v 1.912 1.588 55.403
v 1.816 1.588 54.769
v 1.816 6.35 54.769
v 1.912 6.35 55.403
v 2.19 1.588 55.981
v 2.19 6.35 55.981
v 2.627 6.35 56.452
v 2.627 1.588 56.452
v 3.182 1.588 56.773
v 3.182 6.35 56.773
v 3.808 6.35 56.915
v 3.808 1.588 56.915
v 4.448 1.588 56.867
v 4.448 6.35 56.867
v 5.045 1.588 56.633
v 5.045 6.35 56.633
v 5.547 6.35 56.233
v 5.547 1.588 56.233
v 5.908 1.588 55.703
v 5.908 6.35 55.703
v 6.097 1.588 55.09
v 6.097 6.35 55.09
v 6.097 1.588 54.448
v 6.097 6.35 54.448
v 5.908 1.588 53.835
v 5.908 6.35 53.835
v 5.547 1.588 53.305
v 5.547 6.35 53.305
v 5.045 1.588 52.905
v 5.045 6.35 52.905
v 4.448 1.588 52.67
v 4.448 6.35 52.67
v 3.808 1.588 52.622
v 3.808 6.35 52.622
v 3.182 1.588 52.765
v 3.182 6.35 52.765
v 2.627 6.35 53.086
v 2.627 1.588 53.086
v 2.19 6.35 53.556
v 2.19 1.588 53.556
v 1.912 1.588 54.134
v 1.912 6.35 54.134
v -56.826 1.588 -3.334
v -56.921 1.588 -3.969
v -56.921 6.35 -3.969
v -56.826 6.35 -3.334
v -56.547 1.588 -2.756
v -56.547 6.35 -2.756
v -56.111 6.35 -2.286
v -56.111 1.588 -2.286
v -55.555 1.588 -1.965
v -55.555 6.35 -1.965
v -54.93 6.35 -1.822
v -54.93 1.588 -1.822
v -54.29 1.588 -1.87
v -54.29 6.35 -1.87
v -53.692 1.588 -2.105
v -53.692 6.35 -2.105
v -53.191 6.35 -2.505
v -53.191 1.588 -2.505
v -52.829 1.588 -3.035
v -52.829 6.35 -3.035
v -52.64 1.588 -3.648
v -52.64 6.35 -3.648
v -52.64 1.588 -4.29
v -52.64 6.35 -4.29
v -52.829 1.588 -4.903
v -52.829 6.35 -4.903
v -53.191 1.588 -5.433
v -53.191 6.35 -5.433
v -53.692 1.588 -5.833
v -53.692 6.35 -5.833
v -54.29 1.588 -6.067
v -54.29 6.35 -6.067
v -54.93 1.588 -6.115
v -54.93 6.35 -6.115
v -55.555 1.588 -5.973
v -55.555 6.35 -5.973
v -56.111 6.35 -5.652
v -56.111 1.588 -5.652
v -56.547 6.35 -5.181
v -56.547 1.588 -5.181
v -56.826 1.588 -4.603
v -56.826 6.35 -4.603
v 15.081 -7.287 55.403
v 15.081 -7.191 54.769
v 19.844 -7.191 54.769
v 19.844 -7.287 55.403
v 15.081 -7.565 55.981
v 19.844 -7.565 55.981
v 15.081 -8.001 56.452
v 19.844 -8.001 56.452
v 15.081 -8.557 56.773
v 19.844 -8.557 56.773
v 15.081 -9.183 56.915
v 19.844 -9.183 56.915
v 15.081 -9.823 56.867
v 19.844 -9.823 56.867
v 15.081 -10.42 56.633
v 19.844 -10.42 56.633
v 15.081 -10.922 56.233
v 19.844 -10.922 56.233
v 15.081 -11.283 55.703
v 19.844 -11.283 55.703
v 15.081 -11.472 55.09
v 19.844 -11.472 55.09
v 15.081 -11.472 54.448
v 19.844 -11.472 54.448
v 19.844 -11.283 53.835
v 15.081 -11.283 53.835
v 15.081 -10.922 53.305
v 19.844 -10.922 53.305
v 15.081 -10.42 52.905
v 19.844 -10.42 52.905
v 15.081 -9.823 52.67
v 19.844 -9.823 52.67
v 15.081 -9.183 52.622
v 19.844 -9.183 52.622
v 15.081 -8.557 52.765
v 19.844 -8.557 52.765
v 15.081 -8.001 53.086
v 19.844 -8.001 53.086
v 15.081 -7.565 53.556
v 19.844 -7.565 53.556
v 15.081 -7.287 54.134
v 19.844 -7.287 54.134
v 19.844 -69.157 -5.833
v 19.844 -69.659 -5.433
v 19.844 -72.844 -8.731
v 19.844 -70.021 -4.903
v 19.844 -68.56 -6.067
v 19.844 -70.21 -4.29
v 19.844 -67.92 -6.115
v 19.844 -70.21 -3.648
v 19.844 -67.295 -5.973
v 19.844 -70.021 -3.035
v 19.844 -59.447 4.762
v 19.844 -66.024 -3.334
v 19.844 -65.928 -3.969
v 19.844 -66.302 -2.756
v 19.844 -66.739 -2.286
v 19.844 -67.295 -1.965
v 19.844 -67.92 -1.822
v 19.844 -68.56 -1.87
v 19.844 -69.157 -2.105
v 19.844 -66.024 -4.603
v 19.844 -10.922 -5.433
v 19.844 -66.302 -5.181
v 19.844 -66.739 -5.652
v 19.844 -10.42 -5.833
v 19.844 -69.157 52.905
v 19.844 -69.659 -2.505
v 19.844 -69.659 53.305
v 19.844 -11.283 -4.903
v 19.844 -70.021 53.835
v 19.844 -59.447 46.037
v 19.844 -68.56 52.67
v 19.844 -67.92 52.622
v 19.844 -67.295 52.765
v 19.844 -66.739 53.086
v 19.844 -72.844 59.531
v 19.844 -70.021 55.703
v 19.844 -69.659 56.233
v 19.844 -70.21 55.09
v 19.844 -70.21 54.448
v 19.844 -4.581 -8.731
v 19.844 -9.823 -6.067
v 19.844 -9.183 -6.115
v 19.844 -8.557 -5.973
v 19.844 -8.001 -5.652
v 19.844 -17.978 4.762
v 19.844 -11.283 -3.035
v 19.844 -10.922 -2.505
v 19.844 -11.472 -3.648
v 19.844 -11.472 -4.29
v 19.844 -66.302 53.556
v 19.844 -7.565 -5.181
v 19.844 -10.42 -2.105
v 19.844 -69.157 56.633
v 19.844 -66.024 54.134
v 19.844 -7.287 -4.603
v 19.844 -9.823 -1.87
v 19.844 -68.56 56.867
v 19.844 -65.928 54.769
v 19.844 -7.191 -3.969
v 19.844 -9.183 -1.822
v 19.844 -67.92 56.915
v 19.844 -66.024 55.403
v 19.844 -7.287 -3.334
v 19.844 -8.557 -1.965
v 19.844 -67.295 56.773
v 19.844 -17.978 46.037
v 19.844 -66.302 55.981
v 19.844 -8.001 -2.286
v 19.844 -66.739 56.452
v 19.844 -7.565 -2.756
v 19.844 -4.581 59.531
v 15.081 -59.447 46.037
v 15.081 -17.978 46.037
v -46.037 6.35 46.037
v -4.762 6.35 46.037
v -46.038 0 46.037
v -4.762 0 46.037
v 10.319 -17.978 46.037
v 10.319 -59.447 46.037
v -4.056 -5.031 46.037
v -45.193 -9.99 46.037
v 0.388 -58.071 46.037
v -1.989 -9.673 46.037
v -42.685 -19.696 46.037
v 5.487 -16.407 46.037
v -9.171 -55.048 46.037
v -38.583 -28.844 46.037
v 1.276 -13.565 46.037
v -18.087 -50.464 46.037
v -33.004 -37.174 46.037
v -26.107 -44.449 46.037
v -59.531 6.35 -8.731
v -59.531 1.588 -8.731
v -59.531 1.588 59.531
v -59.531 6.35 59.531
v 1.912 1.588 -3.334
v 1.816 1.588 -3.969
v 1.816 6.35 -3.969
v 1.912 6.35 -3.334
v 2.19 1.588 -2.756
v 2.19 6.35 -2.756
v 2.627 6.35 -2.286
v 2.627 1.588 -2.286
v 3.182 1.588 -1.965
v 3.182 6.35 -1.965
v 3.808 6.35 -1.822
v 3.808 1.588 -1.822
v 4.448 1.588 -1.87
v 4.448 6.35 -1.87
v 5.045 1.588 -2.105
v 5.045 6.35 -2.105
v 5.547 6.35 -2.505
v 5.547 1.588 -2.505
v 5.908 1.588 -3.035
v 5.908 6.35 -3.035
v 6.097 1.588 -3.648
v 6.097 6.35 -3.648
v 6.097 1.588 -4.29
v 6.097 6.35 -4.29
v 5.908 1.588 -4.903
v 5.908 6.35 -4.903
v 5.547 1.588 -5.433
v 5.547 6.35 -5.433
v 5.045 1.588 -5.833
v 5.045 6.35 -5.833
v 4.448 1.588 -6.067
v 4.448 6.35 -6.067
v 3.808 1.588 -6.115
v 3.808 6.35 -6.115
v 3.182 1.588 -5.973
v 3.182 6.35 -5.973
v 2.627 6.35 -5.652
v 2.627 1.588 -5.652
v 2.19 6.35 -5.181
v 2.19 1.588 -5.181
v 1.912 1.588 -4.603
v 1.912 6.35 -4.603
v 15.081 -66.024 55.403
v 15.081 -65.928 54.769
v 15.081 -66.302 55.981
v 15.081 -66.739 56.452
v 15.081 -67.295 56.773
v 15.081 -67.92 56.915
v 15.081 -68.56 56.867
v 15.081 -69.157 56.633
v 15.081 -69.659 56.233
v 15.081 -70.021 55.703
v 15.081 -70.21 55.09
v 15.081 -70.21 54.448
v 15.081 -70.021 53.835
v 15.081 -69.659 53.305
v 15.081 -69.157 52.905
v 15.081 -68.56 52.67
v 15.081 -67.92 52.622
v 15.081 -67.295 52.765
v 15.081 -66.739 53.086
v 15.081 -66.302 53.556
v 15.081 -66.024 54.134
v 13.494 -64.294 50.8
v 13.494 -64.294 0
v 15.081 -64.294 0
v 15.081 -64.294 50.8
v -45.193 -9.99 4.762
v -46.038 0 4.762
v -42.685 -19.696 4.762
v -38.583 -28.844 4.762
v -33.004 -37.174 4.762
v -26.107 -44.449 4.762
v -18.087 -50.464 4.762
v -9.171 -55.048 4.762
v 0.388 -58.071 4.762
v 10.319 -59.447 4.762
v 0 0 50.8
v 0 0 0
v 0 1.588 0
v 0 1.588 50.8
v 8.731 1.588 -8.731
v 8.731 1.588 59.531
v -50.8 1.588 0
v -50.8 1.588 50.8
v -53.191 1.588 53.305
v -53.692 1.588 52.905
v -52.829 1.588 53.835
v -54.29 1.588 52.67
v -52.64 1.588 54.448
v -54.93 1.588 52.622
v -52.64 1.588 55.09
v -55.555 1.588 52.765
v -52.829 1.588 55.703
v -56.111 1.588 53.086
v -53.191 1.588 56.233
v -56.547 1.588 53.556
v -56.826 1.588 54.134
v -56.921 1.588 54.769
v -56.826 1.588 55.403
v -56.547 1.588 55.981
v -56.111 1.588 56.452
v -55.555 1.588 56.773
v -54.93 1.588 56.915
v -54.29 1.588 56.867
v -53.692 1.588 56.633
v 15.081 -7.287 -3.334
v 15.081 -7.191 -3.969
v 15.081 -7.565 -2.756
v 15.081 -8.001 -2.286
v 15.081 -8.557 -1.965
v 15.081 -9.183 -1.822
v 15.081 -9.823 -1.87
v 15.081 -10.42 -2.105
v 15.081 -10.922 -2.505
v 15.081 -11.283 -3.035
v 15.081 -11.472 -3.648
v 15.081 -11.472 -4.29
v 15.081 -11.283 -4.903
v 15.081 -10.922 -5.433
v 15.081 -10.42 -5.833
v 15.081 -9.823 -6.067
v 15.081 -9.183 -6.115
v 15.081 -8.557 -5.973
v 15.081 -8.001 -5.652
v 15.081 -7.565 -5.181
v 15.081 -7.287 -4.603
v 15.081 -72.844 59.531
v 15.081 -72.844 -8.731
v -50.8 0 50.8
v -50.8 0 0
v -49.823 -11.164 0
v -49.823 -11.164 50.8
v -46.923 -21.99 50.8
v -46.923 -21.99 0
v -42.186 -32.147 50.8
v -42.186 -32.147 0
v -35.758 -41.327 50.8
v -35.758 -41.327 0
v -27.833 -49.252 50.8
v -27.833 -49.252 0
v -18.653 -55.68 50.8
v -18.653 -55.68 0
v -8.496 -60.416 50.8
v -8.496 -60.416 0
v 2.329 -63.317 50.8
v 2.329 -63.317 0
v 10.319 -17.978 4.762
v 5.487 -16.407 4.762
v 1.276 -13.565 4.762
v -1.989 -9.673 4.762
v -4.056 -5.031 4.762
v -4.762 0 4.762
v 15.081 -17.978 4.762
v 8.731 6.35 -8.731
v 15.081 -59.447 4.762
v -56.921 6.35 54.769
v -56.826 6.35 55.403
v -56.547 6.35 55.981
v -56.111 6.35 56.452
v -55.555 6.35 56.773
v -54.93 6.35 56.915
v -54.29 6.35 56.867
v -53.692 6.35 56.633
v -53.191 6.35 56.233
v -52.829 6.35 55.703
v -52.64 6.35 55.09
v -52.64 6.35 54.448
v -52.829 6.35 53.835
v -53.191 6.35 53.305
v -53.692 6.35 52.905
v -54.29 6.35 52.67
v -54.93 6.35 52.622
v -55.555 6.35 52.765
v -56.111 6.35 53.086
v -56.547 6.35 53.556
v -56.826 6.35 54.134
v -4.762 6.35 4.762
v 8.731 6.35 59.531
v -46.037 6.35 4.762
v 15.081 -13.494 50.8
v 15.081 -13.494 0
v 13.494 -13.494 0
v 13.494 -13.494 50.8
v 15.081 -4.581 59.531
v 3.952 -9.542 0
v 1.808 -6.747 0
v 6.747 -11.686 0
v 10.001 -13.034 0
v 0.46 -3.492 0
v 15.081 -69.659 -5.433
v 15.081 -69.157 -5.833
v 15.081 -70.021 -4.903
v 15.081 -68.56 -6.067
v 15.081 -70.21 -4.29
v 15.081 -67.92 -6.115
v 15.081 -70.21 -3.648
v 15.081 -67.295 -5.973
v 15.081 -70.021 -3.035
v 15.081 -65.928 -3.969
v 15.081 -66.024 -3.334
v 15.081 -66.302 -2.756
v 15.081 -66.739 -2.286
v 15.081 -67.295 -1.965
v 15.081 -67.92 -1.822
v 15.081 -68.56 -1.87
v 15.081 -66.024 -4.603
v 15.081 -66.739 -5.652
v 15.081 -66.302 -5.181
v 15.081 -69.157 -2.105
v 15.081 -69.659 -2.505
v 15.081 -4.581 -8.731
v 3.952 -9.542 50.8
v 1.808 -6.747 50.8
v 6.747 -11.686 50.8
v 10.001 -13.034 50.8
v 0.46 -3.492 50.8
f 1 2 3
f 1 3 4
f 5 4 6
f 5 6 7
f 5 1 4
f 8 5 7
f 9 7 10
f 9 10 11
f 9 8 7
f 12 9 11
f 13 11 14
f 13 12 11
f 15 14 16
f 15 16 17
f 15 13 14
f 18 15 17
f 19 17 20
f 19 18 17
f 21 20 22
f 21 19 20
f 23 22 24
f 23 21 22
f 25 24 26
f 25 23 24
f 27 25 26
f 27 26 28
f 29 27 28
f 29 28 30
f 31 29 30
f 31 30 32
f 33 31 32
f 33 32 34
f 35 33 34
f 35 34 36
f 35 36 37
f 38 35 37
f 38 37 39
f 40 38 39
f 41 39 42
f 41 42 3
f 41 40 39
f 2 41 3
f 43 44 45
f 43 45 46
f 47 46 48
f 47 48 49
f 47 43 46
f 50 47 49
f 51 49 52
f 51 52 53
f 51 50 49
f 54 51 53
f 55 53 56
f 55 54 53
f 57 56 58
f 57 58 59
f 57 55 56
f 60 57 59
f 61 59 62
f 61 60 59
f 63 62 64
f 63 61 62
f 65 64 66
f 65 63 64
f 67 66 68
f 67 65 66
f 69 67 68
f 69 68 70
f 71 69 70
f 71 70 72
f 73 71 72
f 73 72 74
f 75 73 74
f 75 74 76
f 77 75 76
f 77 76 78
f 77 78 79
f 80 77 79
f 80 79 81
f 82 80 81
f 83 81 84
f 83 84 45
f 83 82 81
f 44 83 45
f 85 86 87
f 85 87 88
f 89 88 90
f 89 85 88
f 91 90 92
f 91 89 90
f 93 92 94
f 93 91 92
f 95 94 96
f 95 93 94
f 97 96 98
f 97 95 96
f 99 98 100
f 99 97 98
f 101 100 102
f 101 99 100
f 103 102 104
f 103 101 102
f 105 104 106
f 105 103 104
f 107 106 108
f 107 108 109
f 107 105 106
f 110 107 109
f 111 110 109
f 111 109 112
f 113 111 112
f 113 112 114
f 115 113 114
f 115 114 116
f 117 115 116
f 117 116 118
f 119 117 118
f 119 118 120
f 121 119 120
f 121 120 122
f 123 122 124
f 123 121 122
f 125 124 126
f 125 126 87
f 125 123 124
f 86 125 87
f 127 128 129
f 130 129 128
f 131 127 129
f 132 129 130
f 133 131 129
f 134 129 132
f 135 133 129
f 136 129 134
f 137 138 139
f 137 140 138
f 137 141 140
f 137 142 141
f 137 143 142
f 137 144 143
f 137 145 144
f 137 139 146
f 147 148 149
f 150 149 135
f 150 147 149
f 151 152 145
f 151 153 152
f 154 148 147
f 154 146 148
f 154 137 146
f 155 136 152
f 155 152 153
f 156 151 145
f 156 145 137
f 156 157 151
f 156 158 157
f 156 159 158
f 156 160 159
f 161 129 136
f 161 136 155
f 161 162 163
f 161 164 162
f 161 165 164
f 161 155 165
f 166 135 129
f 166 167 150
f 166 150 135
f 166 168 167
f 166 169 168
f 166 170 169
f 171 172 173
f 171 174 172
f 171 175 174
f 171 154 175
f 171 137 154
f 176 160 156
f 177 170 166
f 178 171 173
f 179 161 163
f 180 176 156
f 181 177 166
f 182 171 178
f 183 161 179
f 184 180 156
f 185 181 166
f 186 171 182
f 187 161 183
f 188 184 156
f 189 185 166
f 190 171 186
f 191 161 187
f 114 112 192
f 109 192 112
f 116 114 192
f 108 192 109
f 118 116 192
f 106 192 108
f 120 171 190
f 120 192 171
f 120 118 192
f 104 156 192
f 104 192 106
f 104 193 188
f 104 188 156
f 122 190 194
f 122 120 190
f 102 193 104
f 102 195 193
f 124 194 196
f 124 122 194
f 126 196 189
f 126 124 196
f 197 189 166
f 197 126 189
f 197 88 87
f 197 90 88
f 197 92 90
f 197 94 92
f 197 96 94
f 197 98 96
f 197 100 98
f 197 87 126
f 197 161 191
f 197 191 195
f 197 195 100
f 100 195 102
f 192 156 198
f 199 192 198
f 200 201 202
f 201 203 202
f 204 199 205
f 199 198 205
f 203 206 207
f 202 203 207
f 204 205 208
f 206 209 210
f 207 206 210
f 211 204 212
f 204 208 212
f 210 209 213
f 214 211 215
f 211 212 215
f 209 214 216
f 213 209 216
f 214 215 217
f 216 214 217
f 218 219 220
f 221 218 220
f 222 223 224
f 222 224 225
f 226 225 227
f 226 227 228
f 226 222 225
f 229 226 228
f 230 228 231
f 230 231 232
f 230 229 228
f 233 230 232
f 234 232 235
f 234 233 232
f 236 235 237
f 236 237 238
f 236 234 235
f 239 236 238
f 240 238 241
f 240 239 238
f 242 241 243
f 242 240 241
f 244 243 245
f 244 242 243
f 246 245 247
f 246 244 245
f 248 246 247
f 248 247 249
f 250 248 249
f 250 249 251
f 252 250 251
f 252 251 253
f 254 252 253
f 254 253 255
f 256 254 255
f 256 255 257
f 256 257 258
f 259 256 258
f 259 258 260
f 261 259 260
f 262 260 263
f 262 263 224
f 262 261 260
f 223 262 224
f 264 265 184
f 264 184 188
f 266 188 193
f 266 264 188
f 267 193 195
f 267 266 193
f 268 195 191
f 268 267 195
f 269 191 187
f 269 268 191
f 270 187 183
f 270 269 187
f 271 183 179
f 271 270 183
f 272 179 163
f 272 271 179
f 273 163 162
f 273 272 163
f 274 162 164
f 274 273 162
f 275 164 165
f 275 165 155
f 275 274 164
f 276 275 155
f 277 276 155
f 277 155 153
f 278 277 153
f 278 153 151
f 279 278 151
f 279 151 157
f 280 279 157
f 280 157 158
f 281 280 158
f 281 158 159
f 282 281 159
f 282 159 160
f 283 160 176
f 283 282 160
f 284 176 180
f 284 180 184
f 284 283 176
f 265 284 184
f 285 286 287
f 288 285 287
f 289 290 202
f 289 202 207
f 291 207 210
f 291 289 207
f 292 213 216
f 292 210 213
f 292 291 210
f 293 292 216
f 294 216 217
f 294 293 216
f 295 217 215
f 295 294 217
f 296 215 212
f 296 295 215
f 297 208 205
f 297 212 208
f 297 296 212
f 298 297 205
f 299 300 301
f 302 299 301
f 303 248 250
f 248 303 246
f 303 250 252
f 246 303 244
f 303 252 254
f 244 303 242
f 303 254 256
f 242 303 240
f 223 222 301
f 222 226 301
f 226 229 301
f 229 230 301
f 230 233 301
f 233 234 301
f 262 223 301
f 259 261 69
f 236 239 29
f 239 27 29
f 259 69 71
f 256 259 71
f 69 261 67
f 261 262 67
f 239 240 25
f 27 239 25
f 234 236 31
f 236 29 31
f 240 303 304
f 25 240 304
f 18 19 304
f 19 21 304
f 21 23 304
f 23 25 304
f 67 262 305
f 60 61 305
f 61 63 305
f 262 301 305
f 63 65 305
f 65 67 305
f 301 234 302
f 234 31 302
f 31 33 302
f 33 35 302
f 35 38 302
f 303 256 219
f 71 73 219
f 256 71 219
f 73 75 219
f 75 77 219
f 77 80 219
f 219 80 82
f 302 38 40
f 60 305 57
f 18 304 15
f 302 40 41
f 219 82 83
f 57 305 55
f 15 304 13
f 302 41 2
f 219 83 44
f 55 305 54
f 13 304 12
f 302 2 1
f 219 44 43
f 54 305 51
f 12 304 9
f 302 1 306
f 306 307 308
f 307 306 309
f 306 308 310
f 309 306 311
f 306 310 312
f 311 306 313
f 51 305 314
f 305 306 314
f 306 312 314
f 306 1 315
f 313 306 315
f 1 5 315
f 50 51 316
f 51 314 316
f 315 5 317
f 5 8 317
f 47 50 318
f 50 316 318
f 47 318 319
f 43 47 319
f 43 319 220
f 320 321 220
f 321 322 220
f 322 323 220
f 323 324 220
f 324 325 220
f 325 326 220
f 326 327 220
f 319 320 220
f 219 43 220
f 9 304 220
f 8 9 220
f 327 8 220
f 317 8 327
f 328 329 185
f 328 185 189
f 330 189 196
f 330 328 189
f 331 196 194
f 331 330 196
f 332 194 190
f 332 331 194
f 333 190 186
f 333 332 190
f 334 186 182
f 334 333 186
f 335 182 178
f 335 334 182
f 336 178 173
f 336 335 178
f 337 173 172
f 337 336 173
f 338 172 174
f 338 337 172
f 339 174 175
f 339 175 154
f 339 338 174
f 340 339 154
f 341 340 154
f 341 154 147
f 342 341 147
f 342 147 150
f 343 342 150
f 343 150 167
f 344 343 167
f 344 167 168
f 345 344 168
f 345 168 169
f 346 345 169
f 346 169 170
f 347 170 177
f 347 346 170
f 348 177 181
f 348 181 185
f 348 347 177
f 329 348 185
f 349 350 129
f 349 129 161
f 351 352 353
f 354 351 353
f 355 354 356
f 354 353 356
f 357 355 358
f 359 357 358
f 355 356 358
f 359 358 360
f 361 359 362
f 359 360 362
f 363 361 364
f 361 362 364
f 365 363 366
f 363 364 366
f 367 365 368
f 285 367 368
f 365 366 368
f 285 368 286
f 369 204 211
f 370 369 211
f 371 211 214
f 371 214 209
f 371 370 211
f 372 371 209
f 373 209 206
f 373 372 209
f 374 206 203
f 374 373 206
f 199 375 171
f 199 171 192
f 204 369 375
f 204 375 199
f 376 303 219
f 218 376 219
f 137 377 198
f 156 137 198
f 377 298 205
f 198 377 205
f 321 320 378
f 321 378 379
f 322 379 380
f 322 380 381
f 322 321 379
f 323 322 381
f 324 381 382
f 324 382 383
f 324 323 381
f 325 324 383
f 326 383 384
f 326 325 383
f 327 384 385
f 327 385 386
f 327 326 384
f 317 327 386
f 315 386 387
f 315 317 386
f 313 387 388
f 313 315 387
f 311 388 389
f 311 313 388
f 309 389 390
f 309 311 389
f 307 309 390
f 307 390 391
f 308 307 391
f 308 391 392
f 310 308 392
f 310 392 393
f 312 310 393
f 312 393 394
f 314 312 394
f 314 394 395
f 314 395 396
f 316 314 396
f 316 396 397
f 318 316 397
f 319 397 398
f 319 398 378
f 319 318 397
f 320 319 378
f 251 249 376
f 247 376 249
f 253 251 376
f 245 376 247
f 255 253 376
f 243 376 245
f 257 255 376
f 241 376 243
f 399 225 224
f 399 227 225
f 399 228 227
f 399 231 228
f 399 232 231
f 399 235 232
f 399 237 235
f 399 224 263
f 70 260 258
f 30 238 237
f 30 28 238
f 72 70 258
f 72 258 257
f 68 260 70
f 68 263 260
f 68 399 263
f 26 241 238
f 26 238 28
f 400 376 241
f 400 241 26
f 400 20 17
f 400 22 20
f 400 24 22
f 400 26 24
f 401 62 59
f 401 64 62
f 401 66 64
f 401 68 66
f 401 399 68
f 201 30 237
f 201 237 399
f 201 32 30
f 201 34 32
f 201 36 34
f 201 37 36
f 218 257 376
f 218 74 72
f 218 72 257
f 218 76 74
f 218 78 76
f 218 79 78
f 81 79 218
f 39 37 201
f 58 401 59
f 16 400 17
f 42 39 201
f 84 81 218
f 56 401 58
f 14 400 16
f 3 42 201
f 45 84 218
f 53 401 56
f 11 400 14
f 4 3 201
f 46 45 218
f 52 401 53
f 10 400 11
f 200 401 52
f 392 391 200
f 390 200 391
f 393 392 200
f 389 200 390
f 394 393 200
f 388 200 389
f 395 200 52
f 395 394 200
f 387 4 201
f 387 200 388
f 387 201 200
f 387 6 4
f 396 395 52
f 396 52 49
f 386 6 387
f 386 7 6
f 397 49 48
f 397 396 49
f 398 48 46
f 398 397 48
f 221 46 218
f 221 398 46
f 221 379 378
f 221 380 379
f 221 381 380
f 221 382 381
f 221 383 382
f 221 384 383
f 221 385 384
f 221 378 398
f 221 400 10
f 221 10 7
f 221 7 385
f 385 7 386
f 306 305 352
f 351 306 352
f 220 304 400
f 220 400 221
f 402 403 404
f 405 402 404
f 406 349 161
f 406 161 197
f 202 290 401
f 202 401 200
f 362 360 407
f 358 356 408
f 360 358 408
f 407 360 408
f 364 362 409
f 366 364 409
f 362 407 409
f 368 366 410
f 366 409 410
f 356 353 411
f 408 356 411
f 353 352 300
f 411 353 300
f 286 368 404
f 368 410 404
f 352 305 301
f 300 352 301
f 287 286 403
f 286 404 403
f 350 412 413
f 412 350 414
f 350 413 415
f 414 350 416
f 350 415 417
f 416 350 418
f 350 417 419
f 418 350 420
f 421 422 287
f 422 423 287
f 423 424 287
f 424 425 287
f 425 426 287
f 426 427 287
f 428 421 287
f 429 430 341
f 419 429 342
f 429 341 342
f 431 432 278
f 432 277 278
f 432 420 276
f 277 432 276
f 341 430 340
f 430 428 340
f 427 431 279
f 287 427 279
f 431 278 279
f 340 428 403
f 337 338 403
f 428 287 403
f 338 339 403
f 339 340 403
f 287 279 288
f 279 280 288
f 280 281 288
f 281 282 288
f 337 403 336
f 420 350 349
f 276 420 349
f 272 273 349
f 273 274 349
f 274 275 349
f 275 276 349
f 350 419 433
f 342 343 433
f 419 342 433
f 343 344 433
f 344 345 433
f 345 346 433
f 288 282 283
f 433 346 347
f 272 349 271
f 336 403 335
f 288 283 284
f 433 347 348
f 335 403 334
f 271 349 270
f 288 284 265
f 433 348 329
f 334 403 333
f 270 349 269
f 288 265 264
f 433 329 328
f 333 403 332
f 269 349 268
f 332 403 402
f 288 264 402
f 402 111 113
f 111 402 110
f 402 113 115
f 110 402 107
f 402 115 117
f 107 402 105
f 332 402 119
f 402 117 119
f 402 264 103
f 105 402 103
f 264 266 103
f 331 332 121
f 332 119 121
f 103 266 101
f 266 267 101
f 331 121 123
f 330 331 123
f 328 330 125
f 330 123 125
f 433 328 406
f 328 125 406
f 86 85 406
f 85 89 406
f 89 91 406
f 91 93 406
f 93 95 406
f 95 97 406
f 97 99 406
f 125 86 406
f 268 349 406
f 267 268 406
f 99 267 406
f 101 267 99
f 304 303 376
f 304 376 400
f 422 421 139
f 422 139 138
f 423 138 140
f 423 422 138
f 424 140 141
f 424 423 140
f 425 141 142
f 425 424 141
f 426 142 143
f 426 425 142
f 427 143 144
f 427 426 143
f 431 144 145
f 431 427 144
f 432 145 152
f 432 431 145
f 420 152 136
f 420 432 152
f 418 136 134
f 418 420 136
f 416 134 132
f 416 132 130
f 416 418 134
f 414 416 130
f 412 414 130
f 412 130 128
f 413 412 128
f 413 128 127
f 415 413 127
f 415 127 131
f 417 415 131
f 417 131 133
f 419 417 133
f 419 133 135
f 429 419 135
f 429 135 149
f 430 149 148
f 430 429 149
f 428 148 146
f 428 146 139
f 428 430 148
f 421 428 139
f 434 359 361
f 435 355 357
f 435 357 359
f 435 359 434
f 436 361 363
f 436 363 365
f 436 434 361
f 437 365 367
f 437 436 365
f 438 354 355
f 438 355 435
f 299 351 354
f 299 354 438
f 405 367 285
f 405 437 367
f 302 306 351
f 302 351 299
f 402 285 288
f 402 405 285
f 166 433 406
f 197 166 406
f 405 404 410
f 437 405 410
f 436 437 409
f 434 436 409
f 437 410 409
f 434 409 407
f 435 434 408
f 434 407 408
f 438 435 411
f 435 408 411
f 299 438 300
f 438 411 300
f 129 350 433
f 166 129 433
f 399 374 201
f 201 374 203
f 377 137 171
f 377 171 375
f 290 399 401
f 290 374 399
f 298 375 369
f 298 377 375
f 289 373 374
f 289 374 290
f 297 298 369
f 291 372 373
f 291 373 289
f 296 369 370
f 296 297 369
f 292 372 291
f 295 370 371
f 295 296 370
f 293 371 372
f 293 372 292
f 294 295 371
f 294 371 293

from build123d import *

# Parameters (mm, degrees)
F1_DEPTH = 50.8
F2_T     = -4.7625
F3_DEPTH = 4.7625
F4_W     = 68.2625
F4_H     = 68.2625
F4_R     = 2.15265
F4_W_2   = 50.8
F4_H_2   = 50.8
F4_W_3   = 41.4684797912
F4_H_3   = 41.275
F5_DEPTH = 4.7625
F6_W     = 68.2625
F6_H     = 68.2625
F6_R     = 2.15265
F6_W_2   = 41.275
F6_H_2   = 41.275
F7_DEPTH = 4.7625
F8_R     = 2.15265
F9_DEPTH = 74.6135


# Not quite as in the source:
# - a feature names something its author has since deleted; it is built from what else it names


with BuildPart() as f1:
    # F0 (on Top) → F1 (new body)
    with BuildSketch(Plane.XY):
        with BuildLine():
            ThreePointArc((13.49375, -13.49375), (3.9522278714, -9.5415221286), (0, 0))
            Line((0, 0), (0, 1.5875))
            Line((0, 1.5875), (-50.8, 1.5875))
            Line((-50.8, 1.5875), (-50.8, 0))
            ThreePointArc((-50.8, 0), (-31.9687966129, -45.4625466129), (13.49375, -64.29375))
            Line((13.49375, -64.29375), (15.08125, -64.29375))
            Line((15.08125, -64.29375), (15.08125, -13.49375))
            Line((15.08125, -13.49375), (13.49375, -13.49375))
        make_face()
    extrude(amount=F1_DEPTH)

    # F2
    f2_openings = [f1.faces().sort_by_distance(p)[0] for p in [
        (-25.4, 1.5875, 25.4),
    ]]
    offset(amount=F2_T, openings=f2_openings)

    # F3 (cut, through all): a face of the model
    f3_faces = [f1.faces().sort_by_distance(p)[0] for p in [
        (10.31875, -38.7122831446, 25.4),
    ]]
    extrude(f3_faces, amount=-F3_DEPTH, mode=Mode.SUBTRACT)

    # F4 (on face) → F5 (join)
    with BuildSketch(Plane.YZ.offset(15.08125)):
        with Locations((-38.7122831446, 25.4)):
            Rectangle(F4_W, F4_H)
        with Locations((-68.0810331446, -3.96875)):
            Circle(F4_R, mode=Mode.SUBTRACT)
        with Locations((-38.89375, 25.4)):
            Rectangle(F4_W_2, F4_H_2, mode=Mode.SUBTRACT)
        with Locations((-9.3435331446, -3.96875)):
            Circle(F4_R, mode=Mode.SUBTRACT)
        with Locations((-68.0810331446, 54.76875)):
            Circle(F4_R, mode=Mode.SUBTRACT)
        with Locations((-9.3435331446, 54.76875)):
            Circle(F4_R, mode=Mode.SUBTRACT)
        with Locations((-38.89375, 25.4)):
            Rectangle(F4_W_2, F4_H_2)
        with Locations((-38.7122831446, 25.4)):
            Rectangle(F4_W_3, F4_H_3, mode=Mode.SUBTRACT)
    extrude(amount=F5_DEPTH)

    # F6 (on face) → F7 (join)
    with BuildSketch(Plane(origin=(0, 1.5875, 0), x_dir=(-1, 0, 0), z_dir=(0, 1, 0))):
        with Locations((25.4, 25.4)):
            Rectangle(F6_W, F6_H)
        with Locations((-3.96875, -3.96875)):
            Circle(F6_R, mode=Mode.SUBTRACT)
        with Locations((54.76875, -3.96875)):
            Circle(F6_R, mode=Mode.SUBTRACT)
        with Locations((25.4, 25.4)):
            Rectangle(F6_W_2, F6_H_2, mode=Mode.SUBTRACT)
        with Locations((-3.96875, 54.76875)):
            Circle(F6_R, mode=Mode.SUBTRACT)
        with Locations((54.76875, 54.76875)):
            Circle(F6_R, mode=Mode.SUBTRACT)
    extrude(amount=F7_DEPTH)

    # F8 (on face) → F9 (cut, through all)
    with BuildSketch(Plane(origin=(15.08125, 0, 0), x_dir=(0, -1, 0), z_dir=(-1, 0, 0))):
        with BuildLine():
            ThreePointArc((68.0810331446, 59.53125), (64.7134370992, 51.4011539546), (72.8435331446, 54.76875))
            ThreePointArc((72.8435331446, 54.76875), (71.44862919, 58.1363460454), (68.0810331446, 59.53125))
        make_face()
        with Locations((68.0810331446, 54.76875)):
            Circle(F8_R, mode=Mode.SUBTRACT)
        with Locations((68.0810331446, 54.76875)):
            Circle(F8_R)
    extrude(amount=F9_DEPTH, mode=Mode.SUBTRACT)


solid = f1.part
